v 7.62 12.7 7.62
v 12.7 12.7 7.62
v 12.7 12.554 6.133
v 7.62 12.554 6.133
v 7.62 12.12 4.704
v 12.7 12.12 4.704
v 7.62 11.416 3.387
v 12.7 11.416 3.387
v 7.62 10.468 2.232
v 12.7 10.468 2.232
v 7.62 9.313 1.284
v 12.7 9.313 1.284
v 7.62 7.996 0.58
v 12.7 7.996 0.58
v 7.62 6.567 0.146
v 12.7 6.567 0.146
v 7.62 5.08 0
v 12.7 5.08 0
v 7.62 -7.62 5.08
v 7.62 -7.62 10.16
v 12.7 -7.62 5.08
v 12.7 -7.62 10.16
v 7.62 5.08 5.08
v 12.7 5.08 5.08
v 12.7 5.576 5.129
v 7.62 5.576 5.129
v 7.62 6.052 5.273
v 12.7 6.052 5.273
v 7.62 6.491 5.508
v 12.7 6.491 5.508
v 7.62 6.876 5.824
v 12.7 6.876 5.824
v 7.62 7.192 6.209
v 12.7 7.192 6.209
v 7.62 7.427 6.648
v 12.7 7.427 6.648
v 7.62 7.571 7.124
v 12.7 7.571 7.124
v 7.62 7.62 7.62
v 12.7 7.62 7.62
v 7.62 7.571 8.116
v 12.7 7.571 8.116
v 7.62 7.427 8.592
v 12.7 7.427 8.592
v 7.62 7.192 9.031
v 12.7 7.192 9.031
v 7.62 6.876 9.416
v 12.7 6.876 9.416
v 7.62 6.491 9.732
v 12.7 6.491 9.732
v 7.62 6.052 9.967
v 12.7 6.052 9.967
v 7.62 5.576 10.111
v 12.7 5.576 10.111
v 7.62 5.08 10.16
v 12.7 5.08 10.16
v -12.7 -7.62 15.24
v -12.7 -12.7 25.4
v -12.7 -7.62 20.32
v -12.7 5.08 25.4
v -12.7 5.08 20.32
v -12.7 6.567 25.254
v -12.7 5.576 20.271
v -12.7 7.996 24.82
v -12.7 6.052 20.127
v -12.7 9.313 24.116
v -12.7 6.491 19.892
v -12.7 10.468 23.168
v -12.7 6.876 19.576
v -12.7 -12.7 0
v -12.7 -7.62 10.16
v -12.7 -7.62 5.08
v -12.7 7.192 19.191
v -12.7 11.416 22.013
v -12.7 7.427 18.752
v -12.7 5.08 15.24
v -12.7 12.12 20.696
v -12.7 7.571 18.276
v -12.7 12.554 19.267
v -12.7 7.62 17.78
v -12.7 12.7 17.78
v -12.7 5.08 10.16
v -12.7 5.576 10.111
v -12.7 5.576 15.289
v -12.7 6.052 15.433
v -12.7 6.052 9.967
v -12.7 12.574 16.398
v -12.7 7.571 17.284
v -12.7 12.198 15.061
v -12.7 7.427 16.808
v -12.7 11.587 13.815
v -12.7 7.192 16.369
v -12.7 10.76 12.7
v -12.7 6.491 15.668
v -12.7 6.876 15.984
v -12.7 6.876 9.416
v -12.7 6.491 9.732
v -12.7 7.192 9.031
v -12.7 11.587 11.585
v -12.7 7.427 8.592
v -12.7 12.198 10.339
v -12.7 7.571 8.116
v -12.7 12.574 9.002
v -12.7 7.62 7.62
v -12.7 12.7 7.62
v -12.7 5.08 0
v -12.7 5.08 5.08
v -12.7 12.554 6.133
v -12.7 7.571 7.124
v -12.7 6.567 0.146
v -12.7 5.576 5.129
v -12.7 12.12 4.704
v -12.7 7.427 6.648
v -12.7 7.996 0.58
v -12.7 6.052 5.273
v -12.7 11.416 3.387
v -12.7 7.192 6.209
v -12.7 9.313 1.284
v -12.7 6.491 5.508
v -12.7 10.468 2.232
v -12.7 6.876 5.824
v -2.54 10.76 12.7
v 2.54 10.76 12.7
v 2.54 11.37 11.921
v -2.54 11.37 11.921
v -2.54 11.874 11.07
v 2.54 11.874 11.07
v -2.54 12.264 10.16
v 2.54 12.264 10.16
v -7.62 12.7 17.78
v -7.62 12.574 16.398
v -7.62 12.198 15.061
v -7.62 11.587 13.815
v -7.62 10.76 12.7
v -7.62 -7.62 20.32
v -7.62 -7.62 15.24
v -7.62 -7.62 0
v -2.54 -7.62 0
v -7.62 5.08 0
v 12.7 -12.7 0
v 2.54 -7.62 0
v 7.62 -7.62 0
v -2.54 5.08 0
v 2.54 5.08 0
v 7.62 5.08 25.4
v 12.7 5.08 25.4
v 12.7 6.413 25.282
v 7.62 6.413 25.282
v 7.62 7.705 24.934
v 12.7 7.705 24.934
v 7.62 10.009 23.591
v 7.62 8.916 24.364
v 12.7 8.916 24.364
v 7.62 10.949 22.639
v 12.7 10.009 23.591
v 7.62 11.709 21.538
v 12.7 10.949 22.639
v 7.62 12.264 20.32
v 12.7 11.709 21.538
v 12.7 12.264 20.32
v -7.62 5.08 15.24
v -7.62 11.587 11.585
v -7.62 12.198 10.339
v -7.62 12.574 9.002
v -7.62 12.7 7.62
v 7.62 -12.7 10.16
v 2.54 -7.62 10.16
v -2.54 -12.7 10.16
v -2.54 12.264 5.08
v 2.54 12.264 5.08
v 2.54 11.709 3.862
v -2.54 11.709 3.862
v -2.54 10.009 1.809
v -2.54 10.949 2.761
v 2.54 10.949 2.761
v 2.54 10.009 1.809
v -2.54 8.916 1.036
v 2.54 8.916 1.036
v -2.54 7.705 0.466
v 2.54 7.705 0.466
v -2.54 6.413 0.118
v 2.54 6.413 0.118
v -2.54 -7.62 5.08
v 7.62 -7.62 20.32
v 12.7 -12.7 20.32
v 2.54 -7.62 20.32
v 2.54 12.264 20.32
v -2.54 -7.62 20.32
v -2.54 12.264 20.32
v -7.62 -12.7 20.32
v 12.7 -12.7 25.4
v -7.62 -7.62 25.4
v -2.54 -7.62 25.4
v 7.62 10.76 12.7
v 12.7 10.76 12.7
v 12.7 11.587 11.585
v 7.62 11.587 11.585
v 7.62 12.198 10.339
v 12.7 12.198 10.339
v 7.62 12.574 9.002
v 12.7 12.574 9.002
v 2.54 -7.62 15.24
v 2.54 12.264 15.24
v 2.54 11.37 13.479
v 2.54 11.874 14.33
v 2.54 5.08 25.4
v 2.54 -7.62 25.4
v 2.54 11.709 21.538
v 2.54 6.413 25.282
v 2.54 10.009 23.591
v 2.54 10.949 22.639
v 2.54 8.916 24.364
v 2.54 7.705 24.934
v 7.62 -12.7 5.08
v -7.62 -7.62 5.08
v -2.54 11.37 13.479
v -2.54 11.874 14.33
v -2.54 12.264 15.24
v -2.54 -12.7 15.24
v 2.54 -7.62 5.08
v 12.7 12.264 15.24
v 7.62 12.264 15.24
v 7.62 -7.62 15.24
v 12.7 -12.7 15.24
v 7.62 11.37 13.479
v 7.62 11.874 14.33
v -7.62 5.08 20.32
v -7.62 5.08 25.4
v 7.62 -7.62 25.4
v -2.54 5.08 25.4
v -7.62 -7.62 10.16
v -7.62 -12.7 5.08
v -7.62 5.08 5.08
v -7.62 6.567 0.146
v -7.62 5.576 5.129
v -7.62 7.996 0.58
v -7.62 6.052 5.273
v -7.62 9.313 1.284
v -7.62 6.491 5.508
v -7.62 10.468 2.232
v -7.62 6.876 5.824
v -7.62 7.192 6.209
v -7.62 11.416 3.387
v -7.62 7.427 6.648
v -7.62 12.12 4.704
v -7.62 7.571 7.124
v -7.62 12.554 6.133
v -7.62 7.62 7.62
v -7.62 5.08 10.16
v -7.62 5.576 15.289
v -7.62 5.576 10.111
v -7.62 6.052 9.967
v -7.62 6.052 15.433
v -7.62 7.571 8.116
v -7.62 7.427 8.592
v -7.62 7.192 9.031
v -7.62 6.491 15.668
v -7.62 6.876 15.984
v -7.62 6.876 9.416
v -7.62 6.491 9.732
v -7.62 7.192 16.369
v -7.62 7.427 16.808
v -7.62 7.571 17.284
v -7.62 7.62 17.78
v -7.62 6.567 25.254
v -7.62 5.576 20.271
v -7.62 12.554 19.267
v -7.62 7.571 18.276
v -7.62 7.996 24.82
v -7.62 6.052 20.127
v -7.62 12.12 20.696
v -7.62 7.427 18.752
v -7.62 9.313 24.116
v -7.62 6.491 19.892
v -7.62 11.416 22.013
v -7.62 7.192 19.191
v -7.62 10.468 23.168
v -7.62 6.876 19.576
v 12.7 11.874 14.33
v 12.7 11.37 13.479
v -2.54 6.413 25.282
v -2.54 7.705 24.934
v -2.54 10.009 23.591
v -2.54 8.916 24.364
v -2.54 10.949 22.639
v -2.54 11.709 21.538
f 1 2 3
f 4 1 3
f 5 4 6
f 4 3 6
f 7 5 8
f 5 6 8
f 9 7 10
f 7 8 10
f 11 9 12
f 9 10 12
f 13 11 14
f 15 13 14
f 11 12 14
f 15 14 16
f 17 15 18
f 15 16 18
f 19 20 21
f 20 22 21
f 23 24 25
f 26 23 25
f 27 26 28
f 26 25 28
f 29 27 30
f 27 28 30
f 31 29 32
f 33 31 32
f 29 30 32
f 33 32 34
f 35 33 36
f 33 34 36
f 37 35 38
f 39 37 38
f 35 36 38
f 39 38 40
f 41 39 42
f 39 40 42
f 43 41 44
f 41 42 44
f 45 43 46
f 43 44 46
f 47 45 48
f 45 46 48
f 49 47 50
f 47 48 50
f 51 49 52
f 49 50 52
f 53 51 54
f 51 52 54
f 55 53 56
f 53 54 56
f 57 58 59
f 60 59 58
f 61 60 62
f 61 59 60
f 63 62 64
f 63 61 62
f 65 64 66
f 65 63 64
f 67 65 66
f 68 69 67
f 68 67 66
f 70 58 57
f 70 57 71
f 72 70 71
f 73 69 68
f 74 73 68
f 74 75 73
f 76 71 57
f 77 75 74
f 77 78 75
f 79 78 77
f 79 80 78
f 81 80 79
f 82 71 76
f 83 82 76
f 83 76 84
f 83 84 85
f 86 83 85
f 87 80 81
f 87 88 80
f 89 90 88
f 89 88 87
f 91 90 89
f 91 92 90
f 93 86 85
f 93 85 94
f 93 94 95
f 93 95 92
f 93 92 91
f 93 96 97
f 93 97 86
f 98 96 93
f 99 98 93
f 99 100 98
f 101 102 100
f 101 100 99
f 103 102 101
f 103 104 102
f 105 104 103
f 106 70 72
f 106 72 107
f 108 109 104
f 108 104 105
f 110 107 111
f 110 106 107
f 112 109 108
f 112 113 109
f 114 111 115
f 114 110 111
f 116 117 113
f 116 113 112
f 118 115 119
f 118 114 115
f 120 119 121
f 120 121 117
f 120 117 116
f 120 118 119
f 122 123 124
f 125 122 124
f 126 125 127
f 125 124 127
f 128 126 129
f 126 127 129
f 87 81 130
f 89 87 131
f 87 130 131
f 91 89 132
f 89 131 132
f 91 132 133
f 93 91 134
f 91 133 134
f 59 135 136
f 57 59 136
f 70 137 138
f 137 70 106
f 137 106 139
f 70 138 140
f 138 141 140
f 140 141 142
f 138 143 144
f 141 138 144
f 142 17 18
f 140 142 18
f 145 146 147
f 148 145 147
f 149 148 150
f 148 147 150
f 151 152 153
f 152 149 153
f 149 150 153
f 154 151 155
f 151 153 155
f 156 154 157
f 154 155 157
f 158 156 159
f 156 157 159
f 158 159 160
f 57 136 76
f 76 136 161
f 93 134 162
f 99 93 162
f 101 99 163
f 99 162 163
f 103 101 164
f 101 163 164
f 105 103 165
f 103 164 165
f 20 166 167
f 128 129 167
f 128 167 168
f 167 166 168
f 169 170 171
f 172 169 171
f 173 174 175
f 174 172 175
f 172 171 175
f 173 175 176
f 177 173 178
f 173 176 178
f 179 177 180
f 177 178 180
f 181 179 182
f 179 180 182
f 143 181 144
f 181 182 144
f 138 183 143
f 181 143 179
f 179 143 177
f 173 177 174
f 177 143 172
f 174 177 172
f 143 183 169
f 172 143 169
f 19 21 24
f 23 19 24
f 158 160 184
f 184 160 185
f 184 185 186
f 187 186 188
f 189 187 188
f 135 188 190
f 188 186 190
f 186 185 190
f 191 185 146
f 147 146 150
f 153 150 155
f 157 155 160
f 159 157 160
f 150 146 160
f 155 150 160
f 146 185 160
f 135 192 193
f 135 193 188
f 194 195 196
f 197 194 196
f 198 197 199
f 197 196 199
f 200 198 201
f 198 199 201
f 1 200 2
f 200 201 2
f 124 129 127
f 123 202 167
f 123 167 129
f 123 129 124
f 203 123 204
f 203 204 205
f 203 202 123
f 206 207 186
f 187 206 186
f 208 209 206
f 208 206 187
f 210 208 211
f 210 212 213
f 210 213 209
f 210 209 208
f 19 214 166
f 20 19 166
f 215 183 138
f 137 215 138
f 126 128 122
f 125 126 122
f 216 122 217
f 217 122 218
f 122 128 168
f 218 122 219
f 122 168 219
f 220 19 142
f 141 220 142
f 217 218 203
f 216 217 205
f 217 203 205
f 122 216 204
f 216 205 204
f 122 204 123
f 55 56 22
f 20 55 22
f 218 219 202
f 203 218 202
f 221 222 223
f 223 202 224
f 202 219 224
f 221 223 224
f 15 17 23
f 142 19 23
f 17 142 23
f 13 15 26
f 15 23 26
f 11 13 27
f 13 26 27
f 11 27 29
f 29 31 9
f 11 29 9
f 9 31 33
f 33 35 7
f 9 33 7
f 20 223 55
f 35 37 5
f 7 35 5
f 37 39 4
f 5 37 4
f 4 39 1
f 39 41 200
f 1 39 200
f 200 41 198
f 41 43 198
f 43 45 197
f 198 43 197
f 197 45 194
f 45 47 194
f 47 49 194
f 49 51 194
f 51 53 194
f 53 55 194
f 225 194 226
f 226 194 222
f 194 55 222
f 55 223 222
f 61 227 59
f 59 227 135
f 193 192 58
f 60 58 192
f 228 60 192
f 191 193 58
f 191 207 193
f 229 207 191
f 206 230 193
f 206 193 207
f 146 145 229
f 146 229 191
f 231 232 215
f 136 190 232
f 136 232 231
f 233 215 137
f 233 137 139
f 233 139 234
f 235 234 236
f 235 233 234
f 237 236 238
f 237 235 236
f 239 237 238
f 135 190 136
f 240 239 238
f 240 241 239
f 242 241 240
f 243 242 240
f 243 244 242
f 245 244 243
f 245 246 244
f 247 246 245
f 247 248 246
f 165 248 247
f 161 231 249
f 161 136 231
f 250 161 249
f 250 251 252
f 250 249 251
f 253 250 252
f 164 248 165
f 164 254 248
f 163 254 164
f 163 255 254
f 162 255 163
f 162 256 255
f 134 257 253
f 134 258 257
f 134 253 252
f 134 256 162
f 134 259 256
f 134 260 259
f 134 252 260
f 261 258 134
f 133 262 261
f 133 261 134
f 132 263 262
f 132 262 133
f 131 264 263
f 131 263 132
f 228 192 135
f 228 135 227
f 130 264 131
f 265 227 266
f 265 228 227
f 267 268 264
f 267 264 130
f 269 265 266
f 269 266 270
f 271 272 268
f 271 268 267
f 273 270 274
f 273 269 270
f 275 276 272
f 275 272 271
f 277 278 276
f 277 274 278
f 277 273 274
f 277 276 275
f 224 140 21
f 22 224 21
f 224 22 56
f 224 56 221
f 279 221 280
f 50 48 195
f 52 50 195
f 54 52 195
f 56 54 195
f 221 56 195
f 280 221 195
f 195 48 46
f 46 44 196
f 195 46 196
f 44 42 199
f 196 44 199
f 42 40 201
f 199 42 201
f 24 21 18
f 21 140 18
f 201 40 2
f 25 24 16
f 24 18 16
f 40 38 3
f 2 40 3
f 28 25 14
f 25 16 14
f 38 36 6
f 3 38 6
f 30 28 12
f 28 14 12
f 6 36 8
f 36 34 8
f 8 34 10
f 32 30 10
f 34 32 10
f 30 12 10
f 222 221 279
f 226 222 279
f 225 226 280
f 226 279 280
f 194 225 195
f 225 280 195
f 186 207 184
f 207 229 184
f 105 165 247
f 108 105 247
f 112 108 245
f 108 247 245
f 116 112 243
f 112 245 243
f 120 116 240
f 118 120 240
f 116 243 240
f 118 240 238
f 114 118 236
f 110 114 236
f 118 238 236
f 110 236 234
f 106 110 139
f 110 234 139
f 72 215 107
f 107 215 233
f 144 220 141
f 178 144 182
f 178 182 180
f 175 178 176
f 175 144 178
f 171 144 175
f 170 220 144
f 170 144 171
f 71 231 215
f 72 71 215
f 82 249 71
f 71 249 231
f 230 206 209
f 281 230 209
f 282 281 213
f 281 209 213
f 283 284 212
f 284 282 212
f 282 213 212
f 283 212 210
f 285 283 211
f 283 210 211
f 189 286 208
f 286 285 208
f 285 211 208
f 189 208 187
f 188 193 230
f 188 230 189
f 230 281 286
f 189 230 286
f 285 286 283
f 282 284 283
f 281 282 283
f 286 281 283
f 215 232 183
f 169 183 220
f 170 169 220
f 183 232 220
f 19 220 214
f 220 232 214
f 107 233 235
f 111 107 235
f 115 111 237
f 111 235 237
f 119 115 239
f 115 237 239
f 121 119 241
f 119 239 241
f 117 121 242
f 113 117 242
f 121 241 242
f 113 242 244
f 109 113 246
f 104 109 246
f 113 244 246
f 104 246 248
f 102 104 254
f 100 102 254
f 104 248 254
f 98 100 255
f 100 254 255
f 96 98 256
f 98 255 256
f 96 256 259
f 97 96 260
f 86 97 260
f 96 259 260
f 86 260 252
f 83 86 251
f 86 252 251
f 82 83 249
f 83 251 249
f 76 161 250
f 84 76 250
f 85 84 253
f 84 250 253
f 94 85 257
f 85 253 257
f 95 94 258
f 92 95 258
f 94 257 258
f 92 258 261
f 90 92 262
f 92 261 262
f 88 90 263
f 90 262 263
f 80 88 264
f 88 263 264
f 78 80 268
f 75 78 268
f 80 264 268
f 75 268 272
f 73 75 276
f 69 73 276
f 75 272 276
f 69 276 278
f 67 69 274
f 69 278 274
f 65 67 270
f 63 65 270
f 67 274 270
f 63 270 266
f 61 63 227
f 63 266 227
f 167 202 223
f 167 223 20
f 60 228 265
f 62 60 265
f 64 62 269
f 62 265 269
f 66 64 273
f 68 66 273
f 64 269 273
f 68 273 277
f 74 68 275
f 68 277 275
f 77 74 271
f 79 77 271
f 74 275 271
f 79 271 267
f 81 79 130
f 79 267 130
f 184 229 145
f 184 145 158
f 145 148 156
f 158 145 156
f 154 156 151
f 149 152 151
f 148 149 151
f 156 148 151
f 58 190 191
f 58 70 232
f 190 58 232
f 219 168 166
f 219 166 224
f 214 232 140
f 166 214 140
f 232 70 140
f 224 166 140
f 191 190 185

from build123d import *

# Parameters (mm, degrees)
F0_W     = 25.4
F0_H     = 25.4
F1_DEPTH = 25.4
F2_W     = 5.08
F2_H     = 20.32
F3_DEPTH = 25.4
F5_DEPTH = 25.4
F7_DEPTH = 25.4


with BuildPart() as f1:
    # F0 (on Top) → F1 (new body)
    with BuildSketch(Plane.XY):
        Rectangle(F0_W, F0_H)
    extrude(amount=F1_DEPTH)

    # F2 (on face) → F3 (cut)
    with BuildSketch(Plane.XY.offset(25.4)):
        with Locations((-5.08, 2.54)):
            Rectangle(F2_W, F2_H)
        with Locations((5.08, 2.54)):
            Rectangle(F2_W, F2_H)
    extrude(amount=-F3_DEPTH, mode=Mode.SUBTRACT)

    # F4 (on face) → F5 (cut)
    with BuildSketch(Plane.YZ.offset(12.7)):
        with BuildLine():
            Line((5.08, 20.32), (-7.62, 20.32))
            Line((-7.62, 20.32), (-7.62, 15.24))
            Line((-7.62, 15.24), (5.08, 15.24))
            ThreePointArc((5.08, 15.24), (7.62, 17.78), (5.08, 20.32))
        make_face()
        with BuildLine():
            Line((5.08, 10.16), (-7.62, 10.16))
            Line((-7.62, 10.16), (-7.62, 5.08))
            Line((-7.62, 5.08), (5.08, 5.08))
            ThreePointArc((5.08, 5.08), (7.62, 7.62), (5.08, 10.16))
        make_face()
        with BuildLine():
            ThreePointArc((5.08, 25.4), (10.4681536726, 23.1681536726), (12.7, 17.78))
            Line((12.7, 17.78), (12.7, 25.4))
            Line((12.7, 25.4), (5.08, 25.4))
        make_face()
        with BuildLine():
            ThreePointArc((10.7596126628, 12.7), (12.1983933753, 10.3389843241), (12.7, 7.62))
            Line((12.7, 7.62), (12.7, 17.78))
            ThreePointArc((12.7, 17.78), (12.1983933753, 15.0610156759), (10.7596126628, 12.7))
        make_face()
        with BuildLine():
            ThreePointArc((12.7, 7.62), (10.4681536726, 2.2318463274), (5.08, 0))
            Line((5.08, 0), (12.7, 0))
            Line((12.7, 0), (12.7, 7.62))
        make_face()
    extrude(amount=-F5_DEPTH, mode=Mode.SUBTRACT)

    # F6 (on face) → F7 (cut)
    with BuildSketch(Plane.XZ.offset(12.7)):
        Polygon((12.7, 15.24), (12.7, 20.32), (-7.62, 20.32), (-7.62, 15.24), (-7.62, 5.08), (-2.54, 5.08), (7.62, 5.08), (7.62, 10.16), (-2.54, 10.16), (-2.54, 15.24), align=None)
    extrude(amount=-F7_DEPTH, mode=Mode.SUBTRACT)


solid = f1.part
